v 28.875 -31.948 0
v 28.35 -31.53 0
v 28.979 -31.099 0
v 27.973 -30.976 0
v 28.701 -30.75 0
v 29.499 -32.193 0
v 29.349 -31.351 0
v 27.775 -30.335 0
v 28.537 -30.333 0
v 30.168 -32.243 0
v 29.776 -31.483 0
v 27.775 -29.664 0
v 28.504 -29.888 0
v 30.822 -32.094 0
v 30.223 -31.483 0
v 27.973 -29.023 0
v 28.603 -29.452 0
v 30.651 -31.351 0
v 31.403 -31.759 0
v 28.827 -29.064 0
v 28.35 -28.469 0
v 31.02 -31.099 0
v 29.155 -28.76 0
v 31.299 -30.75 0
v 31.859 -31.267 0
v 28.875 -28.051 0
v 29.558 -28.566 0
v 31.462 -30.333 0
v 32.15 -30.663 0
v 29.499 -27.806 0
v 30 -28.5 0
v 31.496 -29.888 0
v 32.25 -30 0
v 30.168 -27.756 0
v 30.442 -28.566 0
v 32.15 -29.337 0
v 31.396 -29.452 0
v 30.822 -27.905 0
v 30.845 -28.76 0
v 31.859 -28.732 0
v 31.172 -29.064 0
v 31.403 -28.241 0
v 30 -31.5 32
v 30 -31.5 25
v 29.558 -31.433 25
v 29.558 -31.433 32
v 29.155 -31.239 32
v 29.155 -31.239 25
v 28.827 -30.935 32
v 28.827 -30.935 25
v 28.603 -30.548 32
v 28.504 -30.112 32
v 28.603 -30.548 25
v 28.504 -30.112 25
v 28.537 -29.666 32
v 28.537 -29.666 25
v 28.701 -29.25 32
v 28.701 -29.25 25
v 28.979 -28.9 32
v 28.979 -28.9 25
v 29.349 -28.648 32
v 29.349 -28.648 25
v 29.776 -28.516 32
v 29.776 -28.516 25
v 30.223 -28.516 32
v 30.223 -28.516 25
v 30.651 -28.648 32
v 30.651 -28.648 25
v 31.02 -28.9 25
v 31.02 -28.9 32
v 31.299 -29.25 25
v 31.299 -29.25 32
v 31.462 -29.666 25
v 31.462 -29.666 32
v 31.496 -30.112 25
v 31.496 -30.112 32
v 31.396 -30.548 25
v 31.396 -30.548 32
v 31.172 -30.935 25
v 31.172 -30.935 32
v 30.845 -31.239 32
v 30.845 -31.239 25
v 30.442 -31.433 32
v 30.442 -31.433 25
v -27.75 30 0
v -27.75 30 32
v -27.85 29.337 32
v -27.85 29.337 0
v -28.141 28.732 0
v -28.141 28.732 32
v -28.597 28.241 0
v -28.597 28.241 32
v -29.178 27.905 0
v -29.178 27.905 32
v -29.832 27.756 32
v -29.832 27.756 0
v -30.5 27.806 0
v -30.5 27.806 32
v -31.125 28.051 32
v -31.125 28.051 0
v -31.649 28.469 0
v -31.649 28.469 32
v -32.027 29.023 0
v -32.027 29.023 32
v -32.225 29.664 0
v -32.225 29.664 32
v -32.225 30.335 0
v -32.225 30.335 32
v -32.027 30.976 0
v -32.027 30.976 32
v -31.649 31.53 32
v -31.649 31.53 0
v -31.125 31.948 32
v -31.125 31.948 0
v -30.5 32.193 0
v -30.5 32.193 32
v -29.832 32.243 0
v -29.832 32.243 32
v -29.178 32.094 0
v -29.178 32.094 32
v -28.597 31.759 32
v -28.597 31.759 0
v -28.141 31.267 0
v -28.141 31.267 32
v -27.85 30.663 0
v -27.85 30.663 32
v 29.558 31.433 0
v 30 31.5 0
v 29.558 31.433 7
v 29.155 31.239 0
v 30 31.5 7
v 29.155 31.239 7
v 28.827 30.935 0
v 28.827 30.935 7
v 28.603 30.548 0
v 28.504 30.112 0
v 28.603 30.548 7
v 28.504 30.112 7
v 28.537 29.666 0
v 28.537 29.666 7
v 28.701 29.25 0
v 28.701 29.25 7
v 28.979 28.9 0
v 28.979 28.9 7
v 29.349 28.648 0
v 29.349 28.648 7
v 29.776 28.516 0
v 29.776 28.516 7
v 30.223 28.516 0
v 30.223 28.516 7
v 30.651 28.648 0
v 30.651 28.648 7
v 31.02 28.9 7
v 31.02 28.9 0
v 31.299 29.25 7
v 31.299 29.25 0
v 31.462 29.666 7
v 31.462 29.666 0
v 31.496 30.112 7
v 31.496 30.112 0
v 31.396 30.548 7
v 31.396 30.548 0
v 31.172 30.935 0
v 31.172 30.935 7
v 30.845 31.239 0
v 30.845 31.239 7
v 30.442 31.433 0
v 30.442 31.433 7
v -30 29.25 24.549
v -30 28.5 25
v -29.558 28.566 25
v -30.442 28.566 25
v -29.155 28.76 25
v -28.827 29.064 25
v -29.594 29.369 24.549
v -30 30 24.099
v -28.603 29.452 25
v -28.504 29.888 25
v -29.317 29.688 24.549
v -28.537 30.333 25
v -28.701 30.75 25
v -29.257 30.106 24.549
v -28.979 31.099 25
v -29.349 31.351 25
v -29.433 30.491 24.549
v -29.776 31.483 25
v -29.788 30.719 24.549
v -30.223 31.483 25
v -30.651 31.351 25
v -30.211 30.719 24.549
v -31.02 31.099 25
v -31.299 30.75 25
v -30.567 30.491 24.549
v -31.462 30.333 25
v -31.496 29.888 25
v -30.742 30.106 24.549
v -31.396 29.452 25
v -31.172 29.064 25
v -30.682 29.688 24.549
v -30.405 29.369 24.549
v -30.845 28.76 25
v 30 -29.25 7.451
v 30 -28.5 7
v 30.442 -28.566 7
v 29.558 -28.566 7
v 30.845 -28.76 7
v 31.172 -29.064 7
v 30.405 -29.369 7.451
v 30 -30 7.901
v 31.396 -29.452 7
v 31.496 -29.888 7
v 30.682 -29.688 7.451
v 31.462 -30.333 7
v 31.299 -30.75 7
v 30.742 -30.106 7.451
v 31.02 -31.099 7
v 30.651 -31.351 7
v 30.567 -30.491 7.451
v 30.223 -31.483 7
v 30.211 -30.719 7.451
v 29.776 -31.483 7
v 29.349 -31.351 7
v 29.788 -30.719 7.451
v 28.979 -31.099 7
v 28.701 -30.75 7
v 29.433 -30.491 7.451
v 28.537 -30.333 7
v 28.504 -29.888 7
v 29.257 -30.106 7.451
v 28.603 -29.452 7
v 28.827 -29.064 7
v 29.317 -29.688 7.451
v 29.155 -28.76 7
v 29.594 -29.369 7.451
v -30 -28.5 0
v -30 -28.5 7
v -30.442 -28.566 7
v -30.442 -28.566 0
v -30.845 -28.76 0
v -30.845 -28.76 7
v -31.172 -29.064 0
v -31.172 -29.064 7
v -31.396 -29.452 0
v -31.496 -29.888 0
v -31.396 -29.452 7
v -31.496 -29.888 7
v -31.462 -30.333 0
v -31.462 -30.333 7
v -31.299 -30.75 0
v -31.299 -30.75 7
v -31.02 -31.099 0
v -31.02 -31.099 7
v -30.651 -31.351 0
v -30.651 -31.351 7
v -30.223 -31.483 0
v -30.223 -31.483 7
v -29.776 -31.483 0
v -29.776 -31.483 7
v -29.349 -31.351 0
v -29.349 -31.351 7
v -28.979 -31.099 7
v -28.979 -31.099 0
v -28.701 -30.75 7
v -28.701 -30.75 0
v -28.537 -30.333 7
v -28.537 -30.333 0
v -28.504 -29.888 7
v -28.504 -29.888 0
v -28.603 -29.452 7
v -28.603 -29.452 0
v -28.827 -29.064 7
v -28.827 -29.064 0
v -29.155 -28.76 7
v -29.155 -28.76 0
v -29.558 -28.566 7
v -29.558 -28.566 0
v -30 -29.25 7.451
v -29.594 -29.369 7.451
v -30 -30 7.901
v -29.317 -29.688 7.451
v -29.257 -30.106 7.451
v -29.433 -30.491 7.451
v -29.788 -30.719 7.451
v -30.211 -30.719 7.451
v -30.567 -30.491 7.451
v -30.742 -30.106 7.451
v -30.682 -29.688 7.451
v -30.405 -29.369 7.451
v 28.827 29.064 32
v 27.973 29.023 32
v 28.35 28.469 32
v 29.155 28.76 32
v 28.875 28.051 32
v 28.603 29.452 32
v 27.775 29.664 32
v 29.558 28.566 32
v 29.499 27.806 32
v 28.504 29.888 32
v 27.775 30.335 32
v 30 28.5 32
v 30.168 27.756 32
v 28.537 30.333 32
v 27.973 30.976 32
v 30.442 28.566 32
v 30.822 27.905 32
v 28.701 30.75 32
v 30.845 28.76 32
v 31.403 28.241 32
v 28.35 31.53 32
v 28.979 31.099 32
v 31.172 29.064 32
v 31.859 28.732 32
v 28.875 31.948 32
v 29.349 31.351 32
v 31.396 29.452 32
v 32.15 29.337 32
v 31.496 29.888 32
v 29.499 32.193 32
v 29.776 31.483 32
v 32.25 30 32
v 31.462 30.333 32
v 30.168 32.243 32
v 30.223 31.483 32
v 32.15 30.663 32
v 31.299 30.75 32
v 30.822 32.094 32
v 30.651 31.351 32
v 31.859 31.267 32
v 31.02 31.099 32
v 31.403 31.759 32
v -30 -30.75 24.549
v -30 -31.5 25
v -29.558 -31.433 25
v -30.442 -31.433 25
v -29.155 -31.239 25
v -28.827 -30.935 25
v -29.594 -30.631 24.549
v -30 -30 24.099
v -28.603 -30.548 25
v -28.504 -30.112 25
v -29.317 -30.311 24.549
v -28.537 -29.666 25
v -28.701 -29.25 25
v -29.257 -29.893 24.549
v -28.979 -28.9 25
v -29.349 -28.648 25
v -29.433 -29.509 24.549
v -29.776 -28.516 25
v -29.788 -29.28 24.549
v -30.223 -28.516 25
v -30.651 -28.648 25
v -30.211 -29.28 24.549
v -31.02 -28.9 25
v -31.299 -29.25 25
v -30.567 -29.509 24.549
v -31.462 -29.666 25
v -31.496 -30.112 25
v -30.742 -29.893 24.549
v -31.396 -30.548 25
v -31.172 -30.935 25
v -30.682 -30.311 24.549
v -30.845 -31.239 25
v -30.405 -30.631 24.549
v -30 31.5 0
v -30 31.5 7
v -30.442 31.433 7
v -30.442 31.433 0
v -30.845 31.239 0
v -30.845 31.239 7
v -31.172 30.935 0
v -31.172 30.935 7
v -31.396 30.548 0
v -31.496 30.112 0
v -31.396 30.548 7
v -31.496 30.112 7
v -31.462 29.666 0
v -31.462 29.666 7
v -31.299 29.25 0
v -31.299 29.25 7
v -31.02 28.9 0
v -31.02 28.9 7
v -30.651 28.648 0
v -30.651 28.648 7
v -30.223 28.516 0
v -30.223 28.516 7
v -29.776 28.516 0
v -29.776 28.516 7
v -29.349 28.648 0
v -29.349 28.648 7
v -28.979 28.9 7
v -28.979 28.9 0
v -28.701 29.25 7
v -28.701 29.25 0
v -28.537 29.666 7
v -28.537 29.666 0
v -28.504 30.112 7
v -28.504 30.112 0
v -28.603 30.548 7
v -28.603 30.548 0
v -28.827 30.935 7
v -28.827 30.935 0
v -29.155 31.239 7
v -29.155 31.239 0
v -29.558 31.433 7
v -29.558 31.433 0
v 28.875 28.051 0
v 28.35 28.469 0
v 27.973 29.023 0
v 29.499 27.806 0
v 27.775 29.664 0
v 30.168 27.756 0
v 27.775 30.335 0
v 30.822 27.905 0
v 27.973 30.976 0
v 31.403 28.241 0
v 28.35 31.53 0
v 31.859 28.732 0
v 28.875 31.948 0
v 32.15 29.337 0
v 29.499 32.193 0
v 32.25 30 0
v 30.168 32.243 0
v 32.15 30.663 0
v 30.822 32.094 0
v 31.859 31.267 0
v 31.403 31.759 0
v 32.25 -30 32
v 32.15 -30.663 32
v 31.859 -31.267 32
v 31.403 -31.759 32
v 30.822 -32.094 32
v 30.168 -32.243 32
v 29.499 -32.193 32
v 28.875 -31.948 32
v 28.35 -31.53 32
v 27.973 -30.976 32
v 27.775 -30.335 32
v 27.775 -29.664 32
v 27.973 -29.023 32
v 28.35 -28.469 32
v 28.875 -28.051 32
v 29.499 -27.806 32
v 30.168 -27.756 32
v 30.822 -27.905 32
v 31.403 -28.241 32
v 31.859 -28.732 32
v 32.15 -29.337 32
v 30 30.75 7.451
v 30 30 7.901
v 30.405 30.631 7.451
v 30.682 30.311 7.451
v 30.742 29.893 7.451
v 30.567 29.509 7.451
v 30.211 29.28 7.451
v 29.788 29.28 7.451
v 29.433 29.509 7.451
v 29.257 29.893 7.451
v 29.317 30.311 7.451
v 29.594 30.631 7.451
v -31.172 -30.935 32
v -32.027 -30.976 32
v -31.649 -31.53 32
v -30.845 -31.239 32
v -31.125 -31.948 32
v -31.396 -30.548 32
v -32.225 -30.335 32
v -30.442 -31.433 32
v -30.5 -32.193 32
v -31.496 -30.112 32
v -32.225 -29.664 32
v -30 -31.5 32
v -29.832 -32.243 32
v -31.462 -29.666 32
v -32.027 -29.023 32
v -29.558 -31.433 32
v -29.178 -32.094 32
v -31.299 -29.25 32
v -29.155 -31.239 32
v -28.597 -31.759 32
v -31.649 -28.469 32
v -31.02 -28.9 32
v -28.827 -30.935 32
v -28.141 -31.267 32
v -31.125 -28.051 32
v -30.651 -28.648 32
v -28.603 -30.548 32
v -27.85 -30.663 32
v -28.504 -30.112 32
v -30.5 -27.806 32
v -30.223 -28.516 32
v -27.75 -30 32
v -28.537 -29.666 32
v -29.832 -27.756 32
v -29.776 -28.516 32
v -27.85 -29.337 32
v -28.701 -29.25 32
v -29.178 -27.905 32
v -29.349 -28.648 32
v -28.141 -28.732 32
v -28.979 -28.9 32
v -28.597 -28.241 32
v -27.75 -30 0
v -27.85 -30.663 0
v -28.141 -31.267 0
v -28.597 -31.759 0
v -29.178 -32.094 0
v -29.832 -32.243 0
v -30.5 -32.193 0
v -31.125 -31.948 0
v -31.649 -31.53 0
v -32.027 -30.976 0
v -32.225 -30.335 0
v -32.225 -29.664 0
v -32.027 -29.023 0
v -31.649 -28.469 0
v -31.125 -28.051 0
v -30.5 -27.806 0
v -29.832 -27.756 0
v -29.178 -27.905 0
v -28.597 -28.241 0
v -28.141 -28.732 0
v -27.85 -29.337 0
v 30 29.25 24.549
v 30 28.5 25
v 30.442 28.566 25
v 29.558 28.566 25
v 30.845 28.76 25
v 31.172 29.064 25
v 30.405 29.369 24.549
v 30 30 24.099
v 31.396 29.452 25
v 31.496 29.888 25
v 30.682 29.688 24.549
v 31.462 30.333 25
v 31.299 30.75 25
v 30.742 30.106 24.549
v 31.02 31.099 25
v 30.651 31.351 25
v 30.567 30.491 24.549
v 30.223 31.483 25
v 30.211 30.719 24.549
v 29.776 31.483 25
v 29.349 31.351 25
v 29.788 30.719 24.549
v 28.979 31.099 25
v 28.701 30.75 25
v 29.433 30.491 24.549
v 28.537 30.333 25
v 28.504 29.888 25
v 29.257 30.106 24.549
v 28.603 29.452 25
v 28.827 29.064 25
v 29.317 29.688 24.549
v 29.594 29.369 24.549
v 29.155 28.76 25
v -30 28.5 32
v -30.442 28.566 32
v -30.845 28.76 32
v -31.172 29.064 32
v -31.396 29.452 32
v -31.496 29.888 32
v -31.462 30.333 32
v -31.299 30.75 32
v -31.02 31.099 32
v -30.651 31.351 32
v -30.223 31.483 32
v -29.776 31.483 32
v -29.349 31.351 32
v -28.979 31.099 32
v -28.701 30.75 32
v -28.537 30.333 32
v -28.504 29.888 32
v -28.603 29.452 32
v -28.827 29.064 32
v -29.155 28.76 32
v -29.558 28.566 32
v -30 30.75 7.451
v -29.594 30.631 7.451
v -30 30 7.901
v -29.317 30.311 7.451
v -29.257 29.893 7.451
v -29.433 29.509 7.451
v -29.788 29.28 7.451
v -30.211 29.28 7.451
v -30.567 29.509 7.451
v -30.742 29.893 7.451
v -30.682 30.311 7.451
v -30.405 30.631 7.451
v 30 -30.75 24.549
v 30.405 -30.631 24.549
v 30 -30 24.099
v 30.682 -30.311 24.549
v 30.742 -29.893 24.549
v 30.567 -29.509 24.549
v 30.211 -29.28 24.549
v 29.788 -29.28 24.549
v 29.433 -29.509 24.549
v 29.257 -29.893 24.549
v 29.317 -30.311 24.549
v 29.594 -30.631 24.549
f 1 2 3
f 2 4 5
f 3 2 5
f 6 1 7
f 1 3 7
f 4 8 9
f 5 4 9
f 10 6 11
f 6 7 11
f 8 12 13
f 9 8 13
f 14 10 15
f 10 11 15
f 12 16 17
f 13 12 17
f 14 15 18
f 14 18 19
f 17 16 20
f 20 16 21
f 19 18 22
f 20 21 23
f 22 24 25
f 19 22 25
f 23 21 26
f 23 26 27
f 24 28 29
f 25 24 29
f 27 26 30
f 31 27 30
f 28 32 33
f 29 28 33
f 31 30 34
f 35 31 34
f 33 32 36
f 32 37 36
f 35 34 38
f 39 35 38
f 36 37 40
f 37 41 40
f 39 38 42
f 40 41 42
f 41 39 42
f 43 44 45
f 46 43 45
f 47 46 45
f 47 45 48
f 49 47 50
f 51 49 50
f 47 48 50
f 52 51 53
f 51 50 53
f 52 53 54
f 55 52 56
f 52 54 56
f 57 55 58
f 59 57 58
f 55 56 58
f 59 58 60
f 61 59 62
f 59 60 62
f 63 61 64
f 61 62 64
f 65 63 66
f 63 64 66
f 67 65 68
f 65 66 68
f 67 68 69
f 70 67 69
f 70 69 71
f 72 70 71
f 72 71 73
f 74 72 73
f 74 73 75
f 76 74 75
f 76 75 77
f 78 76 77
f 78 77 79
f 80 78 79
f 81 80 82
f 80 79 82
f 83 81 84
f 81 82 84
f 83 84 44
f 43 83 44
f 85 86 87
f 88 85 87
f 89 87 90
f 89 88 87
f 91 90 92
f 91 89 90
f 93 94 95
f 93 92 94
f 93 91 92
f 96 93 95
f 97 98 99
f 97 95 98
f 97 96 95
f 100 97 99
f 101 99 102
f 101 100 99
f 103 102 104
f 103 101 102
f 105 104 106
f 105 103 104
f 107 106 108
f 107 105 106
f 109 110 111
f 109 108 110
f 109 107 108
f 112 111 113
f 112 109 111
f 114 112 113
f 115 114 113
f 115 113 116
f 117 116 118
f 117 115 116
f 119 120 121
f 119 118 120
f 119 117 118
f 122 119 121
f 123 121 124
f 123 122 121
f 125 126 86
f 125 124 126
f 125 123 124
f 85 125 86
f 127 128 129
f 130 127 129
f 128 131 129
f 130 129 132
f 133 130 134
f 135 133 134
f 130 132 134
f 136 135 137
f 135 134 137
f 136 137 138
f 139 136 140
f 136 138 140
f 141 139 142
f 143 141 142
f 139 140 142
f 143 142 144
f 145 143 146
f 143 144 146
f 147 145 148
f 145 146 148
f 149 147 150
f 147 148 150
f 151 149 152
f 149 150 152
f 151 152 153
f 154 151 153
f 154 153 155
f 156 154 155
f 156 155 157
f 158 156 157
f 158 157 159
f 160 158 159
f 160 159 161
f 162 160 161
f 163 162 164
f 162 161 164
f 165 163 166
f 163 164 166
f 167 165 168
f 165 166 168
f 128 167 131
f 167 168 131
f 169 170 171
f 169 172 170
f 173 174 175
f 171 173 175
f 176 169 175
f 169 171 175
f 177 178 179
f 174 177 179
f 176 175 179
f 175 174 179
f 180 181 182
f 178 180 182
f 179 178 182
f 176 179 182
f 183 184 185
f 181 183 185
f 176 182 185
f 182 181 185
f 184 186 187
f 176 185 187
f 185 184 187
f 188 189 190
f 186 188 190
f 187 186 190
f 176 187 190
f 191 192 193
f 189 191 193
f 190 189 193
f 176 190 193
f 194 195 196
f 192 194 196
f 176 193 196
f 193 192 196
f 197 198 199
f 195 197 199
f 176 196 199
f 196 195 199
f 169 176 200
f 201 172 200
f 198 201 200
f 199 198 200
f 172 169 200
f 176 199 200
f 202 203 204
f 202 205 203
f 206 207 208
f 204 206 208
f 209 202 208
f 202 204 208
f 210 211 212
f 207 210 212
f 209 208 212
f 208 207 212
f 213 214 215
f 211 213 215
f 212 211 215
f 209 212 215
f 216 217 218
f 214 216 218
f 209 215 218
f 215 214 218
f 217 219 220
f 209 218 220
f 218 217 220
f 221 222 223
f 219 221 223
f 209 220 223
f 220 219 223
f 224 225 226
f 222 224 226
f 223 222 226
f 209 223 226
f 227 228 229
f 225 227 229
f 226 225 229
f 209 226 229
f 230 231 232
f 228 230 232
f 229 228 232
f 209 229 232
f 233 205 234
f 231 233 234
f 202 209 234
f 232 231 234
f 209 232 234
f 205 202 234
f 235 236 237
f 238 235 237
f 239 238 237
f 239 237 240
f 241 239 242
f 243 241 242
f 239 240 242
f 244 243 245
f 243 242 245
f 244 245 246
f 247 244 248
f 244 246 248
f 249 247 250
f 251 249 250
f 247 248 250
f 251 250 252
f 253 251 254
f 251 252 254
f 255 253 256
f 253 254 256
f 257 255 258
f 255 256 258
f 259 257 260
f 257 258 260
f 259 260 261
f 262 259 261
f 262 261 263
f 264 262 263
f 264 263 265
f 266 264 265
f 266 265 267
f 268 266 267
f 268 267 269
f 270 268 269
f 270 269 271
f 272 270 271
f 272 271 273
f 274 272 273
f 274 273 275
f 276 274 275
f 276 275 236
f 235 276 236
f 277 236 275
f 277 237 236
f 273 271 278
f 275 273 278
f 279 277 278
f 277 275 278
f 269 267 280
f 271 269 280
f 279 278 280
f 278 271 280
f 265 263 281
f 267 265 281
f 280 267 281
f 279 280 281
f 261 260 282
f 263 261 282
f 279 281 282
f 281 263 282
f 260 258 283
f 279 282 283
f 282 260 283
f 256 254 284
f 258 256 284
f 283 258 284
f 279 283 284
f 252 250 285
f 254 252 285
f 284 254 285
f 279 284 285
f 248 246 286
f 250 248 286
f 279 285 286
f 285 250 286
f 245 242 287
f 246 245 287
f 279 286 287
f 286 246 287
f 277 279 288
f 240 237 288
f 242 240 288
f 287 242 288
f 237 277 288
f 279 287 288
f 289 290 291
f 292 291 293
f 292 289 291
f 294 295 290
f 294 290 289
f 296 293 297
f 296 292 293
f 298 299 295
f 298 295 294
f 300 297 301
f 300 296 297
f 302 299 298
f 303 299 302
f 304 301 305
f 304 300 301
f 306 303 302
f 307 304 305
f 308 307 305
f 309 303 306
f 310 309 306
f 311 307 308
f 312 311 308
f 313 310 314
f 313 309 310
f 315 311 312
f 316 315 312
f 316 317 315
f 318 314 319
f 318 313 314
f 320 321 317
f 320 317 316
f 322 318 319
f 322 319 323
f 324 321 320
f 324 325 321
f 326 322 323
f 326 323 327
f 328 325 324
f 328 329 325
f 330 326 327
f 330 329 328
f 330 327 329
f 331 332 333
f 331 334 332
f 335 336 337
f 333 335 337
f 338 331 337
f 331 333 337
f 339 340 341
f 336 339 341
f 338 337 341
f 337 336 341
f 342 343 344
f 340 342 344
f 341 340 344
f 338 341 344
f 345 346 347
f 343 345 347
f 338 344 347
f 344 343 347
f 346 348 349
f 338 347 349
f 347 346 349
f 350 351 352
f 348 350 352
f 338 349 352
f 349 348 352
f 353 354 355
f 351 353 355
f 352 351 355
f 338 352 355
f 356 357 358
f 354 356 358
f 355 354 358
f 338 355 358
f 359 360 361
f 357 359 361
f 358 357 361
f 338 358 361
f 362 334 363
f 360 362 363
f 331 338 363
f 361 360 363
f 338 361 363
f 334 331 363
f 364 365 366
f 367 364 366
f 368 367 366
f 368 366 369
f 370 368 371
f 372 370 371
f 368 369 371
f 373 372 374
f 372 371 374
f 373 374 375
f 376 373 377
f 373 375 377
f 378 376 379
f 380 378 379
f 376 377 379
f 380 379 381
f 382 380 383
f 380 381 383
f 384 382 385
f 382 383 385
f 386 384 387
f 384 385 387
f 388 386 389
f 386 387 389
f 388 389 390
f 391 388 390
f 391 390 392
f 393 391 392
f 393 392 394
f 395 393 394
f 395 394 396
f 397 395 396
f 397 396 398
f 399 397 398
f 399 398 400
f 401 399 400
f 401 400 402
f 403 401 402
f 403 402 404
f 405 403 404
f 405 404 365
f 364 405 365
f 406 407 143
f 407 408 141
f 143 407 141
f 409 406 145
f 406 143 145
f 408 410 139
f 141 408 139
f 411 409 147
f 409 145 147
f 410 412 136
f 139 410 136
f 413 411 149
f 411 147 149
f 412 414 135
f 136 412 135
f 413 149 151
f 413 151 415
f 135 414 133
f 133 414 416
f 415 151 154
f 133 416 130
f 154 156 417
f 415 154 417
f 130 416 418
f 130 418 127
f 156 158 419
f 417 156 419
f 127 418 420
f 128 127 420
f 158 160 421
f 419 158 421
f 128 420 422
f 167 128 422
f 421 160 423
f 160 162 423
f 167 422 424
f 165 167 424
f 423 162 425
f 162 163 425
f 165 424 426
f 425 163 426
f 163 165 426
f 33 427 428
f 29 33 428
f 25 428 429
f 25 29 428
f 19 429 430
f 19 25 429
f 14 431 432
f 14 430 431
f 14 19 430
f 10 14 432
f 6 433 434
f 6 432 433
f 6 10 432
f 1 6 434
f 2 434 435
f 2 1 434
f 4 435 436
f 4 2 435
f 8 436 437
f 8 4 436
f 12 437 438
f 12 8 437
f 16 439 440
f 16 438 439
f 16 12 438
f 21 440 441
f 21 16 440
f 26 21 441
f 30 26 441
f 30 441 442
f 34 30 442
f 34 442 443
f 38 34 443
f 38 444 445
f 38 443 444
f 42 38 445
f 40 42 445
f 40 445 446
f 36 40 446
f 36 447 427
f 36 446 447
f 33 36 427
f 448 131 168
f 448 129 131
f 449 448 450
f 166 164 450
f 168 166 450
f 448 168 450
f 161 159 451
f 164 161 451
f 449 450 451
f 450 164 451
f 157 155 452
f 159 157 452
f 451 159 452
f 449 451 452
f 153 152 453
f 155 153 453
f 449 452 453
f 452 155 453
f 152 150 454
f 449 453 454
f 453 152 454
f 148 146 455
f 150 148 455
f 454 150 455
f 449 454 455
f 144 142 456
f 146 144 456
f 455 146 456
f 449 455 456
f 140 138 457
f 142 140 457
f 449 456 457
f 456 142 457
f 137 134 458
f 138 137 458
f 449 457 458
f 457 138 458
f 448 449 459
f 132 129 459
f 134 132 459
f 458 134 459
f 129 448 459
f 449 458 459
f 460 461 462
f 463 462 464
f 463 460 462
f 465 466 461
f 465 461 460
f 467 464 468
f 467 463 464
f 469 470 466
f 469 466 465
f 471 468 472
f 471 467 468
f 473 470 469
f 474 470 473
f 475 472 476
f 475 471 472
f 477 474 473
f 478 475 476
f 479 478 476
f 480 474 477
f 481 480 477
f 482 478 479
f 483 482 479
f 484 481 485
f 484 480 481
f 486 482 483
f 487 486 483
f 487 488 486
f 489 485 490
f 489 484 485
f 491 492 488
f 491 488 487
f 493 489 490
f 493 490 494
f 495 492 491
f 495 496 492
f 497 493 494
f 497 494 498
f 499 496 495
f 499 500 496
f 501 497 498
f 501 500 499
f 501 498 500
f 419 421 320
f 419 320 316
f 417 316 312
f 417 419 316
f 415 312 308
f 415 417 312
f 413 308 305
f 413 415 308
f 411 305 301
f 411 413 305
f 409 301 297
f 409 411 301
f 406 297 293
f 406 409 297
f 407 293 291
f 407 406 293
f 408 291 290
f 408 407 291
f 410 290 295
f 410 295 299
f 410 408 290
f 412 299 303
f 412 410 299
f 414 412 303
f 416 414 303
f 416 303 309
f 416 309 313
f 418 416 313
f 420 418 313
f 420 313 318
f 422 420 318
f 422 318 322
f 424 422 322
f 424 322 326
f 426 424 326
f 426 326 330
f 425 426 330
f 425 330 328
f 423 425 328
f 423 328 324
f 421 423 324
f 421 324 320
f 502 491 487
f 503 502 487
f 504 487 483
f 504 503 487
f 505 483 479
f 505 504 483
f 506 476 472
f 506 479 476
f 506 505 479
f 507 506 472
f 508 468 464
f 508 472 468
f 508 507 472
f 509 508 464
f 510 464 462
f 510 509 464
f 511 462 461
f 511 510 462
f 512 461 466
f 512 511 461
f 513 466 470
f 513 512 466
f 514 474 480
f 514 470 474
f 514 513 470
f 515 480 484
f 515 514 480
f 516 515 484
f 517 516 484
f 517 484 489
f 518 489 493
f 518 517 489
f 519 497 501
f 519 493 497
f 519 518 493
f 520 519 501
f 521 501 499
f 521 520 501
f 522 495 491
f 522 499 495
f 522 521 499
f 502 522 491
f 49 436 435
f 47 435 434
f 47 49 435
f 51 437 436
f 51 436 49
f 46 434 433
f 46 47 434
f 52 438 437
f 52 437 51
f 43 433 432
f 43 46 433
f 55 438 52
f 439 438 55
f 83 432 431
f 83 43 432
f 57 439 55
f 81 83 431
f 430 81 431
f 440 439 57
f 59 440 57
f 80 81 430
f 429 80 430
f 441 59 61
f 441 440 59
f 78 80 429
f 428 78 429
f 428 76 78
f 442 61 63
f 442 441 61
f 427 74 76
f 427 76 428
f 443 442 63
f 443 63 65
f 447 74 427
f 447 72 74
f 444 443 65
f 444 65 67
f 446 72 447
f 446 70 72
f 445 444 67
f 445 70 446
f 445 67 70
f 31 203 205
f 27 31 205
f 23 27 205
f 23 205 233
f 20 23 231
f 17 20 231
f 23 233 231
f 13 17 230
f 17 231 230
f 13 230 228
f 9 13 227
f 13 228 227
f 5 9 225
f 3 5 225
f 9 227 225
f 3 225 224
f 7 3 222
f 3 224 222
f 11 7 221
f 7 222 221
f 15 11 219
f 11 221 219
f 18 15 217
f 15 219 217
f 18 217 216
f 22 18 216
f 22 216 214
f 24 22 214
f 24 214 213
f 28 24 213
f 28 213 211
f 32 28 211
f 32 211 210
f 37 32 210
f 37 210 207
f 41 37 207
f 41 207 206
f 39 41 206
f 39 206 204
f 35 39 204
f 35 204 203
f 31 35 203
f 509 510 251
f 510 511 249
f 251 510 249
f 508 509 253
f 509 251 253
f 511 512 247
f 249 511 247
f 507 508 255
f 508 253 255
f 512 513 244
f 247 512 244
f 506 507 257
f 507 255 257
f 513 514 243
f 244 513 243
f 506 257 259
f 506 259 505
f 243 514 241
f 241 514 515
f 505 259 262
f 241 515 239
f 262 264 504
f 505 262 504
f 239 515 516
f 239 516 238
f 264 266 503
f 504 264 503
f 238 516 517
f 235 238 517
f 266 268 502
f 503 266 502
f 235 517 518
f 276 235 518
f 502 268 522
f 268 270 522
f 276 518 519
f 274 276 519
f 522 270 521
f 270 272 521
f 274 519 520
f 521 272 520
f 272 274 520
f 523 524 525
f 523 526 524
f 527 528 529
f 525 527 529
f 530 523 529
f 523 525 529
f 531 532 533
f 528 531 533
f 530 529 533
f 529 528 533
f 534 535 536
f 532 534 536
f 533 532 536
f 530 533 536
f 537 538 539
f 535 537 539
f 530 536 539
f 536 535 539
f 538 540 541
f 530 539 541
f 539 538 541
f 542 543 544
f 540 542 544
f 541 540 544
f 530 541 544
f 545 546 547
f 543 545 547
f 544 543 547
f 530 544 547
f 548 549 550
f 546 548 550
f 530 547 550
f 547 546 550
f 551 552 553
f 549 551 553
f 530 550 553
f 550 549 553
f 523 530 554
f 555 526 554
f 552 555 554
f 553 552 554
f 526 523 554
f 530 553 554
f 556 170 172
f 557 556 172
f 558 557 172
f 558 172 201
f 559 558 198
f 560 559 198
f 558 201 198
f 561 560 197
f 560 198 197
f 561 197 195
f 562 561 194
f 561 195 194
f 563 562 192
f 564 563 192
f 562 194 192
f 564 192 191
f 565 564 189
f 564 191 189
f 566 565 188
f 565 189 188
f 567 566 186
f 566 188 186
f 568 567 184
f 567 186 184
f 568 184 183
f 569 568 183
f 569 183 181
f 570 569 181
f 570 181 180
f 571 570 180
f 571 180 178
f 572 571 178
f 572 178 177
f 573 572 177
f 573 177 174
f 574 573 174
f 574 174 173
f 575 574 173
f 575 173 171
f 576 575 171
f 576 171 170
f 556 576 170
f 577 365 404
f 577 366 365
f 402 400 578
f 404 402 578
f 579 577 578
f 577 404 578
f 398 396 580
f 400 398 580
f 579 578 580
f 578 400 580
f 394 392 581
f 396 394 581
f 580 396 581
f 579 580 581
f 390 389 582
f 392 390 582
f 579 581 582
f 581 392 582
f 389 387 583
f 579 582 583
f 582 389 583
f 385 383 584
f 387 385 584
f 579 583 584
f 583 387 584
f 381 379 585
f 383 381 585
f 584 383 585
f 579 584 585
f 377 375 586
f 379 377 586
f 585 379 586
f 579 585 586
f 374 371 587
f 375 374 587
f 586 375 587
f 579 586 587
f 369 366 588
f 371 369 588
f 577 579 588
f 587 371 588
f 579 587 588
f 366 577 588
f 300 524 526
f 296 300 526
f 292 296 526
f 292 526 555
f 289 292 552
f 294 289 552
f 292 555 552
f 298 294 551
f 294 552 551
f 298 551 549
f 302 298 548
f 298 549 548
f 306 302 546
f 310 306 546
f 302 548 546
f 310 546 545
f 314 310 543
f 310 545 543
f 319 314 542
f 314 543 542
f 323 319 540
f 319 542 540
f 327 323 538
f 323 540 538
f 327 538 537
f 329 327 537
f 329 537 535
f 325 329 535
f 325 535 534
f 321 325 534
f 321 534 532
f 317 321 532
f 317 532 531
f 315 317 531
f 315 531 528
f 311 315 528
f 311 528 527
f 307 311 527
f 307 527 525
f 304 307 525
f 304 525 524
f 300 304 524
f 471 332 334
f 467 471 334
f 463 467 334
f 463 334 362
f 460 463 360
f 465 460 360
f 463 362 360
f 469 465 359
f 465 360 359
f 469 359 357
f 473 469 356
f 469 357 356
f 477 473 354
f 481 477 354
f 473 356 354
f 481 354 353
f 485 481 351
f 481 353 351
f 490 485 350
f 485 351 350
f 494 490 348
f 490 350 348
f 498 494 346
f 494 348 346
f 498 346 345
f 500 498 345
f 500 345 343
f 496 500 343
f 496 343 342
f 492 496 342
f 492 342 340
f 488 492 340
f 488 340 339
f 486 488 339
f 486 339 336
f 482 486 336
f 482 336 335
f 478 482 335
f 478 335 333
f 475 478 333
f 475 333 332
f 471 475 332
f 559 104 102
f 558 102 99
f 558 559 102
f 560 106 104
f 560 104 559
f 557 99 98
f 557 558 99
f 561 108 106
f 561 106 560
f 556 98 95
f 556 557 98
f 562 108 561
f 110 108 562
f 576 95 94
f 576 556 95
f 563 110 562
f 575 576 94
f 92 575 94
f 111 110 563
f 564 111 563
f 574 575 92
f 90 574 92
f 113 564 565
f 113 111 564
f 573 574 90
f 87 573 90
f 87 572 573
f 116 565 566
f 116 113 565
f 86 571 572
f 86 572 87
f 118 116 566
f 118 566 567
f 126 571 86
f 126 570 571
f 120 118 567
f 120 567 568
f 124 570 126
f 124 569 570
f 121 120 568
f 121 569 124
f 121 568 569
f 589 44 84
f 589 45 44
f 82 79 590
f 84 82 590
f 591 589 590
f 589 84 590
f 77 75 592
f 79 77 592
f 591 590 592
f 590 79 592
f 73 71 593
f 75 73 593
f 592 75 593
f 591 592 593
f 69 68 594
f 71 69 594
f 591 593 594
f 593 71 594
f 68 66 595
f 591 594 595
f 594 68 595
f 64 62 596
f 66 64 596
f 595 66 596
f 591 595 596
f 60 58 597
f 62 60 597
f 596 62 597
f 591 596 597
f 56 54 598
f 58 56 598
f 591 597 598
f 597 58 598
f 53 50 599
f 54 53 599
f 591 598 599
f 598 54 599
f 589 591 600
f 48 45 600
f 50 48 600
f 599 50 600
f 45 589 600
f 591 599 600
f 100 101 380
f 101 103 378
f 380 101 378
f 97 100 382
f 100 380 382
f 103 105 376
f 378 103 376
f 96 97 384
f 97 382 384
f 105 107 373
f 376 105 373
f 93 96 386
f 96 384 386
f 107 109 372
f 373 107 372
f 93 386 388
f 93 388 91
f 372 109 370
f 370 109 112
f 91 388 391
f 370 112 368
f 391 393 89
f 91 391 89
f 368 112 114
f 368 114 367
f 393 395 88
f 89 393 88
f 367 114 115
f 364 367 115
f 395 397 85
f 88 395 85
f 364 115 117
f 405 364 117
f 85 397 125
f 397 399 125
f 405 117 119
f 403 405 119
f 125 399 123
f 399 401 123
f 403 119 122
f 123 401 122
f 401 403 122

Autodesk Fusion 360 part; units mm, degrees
sketch "Sketch1" plane through (0, 0, 0) normal (0, 0, 1) x (1, 0, 0)
  line L0 (0, 0) -> (29.9997, 29.9997)
  line L1 (0, 0) -> (42.426, 0) construction
  circle A0 centre (29.9997, 29.9997) radius 2.25
  circle A1 centre (29.9997, -29.9997) radius 2.25
  line L2 (0, 0) -> (0, 45)
  circle A2 centre (-29.9997, 29.9997) radius 2.25
  circle A3 centre (-29.9997, -29.9997) radius 2.25
  dimension "d1" = 42.426
  dimension "d2" = 45
  dimension "d3" = 4.5
extrude "Extrude1" add sketch "Sketch1" along normal blind 40 makes body 1 at (-27.7525, 29.8876, 26.6667) makes body 2 at (-27.7525, -30.1119, 26.6667) makes body 3 at (32.2385, 30.2237, 26.6667) makes body 4 at (32.2469, -30.1119, 26.6667)
extrude "Extrude2" cut 4 faces at (-31.2583, 30.3025, 40) (30.6527, 30.6433, 40) (-31.0353, -29.6803, 40) (29.6247, -30.6492, 40) along direction (0, 0, -1) blind 8 on bodies 1 2 3 4 bodies 1 2 3 4
hole "Hole1" at (-29.9997, 29.9997, 32) direction (0, 0, -1) diameter 3 depth 7 tip angle 118 bodies 1
hole "Hole2" at (29.9997, 29.9997, 32) direction (0, 0, -1) diameter 3 depth 7 tip angle 118 bodies 3
hole "Hole3" at (29.9997, -29.9997, 32) direction (0, 0, -1) diameter 3 depth 7 tip angle 118 bodies 4
hole "Hole4" at (-29.9997, -29.9997, 32) direction (0, 0, -1) diameter 3 depth 7 tip angle 118 bodies 2
hole "Hole5" at (-29.9997, -29.9997, 0) direction (0, 0, 1) diameter 3 depth 7 tip angle 118 bodies 2
hole "Hole6" at (29.9997, -29.9997, 0) direction (0, 0, 1) diameter 3 depth 7 tip angle 118 bodies 4
hole "Hole7" at (29.9997, 29.9997, 0) direction (0, 0, 1) diameter 3 depth 7 tip angle 118 bodies 3
hole "Hole8" at (-29.9997, 29.9997, 0) direction (0, 0, 1) diameter 3 depth 7 tip angle 118 bodies 1
sketch "Sketch2" plane through (0, 0, 0) normal (0, 0, 1) x (1, 0, 0)
  circle A0 centre (0, 0) radius 1.75
  dimension "d33" = 3.5
